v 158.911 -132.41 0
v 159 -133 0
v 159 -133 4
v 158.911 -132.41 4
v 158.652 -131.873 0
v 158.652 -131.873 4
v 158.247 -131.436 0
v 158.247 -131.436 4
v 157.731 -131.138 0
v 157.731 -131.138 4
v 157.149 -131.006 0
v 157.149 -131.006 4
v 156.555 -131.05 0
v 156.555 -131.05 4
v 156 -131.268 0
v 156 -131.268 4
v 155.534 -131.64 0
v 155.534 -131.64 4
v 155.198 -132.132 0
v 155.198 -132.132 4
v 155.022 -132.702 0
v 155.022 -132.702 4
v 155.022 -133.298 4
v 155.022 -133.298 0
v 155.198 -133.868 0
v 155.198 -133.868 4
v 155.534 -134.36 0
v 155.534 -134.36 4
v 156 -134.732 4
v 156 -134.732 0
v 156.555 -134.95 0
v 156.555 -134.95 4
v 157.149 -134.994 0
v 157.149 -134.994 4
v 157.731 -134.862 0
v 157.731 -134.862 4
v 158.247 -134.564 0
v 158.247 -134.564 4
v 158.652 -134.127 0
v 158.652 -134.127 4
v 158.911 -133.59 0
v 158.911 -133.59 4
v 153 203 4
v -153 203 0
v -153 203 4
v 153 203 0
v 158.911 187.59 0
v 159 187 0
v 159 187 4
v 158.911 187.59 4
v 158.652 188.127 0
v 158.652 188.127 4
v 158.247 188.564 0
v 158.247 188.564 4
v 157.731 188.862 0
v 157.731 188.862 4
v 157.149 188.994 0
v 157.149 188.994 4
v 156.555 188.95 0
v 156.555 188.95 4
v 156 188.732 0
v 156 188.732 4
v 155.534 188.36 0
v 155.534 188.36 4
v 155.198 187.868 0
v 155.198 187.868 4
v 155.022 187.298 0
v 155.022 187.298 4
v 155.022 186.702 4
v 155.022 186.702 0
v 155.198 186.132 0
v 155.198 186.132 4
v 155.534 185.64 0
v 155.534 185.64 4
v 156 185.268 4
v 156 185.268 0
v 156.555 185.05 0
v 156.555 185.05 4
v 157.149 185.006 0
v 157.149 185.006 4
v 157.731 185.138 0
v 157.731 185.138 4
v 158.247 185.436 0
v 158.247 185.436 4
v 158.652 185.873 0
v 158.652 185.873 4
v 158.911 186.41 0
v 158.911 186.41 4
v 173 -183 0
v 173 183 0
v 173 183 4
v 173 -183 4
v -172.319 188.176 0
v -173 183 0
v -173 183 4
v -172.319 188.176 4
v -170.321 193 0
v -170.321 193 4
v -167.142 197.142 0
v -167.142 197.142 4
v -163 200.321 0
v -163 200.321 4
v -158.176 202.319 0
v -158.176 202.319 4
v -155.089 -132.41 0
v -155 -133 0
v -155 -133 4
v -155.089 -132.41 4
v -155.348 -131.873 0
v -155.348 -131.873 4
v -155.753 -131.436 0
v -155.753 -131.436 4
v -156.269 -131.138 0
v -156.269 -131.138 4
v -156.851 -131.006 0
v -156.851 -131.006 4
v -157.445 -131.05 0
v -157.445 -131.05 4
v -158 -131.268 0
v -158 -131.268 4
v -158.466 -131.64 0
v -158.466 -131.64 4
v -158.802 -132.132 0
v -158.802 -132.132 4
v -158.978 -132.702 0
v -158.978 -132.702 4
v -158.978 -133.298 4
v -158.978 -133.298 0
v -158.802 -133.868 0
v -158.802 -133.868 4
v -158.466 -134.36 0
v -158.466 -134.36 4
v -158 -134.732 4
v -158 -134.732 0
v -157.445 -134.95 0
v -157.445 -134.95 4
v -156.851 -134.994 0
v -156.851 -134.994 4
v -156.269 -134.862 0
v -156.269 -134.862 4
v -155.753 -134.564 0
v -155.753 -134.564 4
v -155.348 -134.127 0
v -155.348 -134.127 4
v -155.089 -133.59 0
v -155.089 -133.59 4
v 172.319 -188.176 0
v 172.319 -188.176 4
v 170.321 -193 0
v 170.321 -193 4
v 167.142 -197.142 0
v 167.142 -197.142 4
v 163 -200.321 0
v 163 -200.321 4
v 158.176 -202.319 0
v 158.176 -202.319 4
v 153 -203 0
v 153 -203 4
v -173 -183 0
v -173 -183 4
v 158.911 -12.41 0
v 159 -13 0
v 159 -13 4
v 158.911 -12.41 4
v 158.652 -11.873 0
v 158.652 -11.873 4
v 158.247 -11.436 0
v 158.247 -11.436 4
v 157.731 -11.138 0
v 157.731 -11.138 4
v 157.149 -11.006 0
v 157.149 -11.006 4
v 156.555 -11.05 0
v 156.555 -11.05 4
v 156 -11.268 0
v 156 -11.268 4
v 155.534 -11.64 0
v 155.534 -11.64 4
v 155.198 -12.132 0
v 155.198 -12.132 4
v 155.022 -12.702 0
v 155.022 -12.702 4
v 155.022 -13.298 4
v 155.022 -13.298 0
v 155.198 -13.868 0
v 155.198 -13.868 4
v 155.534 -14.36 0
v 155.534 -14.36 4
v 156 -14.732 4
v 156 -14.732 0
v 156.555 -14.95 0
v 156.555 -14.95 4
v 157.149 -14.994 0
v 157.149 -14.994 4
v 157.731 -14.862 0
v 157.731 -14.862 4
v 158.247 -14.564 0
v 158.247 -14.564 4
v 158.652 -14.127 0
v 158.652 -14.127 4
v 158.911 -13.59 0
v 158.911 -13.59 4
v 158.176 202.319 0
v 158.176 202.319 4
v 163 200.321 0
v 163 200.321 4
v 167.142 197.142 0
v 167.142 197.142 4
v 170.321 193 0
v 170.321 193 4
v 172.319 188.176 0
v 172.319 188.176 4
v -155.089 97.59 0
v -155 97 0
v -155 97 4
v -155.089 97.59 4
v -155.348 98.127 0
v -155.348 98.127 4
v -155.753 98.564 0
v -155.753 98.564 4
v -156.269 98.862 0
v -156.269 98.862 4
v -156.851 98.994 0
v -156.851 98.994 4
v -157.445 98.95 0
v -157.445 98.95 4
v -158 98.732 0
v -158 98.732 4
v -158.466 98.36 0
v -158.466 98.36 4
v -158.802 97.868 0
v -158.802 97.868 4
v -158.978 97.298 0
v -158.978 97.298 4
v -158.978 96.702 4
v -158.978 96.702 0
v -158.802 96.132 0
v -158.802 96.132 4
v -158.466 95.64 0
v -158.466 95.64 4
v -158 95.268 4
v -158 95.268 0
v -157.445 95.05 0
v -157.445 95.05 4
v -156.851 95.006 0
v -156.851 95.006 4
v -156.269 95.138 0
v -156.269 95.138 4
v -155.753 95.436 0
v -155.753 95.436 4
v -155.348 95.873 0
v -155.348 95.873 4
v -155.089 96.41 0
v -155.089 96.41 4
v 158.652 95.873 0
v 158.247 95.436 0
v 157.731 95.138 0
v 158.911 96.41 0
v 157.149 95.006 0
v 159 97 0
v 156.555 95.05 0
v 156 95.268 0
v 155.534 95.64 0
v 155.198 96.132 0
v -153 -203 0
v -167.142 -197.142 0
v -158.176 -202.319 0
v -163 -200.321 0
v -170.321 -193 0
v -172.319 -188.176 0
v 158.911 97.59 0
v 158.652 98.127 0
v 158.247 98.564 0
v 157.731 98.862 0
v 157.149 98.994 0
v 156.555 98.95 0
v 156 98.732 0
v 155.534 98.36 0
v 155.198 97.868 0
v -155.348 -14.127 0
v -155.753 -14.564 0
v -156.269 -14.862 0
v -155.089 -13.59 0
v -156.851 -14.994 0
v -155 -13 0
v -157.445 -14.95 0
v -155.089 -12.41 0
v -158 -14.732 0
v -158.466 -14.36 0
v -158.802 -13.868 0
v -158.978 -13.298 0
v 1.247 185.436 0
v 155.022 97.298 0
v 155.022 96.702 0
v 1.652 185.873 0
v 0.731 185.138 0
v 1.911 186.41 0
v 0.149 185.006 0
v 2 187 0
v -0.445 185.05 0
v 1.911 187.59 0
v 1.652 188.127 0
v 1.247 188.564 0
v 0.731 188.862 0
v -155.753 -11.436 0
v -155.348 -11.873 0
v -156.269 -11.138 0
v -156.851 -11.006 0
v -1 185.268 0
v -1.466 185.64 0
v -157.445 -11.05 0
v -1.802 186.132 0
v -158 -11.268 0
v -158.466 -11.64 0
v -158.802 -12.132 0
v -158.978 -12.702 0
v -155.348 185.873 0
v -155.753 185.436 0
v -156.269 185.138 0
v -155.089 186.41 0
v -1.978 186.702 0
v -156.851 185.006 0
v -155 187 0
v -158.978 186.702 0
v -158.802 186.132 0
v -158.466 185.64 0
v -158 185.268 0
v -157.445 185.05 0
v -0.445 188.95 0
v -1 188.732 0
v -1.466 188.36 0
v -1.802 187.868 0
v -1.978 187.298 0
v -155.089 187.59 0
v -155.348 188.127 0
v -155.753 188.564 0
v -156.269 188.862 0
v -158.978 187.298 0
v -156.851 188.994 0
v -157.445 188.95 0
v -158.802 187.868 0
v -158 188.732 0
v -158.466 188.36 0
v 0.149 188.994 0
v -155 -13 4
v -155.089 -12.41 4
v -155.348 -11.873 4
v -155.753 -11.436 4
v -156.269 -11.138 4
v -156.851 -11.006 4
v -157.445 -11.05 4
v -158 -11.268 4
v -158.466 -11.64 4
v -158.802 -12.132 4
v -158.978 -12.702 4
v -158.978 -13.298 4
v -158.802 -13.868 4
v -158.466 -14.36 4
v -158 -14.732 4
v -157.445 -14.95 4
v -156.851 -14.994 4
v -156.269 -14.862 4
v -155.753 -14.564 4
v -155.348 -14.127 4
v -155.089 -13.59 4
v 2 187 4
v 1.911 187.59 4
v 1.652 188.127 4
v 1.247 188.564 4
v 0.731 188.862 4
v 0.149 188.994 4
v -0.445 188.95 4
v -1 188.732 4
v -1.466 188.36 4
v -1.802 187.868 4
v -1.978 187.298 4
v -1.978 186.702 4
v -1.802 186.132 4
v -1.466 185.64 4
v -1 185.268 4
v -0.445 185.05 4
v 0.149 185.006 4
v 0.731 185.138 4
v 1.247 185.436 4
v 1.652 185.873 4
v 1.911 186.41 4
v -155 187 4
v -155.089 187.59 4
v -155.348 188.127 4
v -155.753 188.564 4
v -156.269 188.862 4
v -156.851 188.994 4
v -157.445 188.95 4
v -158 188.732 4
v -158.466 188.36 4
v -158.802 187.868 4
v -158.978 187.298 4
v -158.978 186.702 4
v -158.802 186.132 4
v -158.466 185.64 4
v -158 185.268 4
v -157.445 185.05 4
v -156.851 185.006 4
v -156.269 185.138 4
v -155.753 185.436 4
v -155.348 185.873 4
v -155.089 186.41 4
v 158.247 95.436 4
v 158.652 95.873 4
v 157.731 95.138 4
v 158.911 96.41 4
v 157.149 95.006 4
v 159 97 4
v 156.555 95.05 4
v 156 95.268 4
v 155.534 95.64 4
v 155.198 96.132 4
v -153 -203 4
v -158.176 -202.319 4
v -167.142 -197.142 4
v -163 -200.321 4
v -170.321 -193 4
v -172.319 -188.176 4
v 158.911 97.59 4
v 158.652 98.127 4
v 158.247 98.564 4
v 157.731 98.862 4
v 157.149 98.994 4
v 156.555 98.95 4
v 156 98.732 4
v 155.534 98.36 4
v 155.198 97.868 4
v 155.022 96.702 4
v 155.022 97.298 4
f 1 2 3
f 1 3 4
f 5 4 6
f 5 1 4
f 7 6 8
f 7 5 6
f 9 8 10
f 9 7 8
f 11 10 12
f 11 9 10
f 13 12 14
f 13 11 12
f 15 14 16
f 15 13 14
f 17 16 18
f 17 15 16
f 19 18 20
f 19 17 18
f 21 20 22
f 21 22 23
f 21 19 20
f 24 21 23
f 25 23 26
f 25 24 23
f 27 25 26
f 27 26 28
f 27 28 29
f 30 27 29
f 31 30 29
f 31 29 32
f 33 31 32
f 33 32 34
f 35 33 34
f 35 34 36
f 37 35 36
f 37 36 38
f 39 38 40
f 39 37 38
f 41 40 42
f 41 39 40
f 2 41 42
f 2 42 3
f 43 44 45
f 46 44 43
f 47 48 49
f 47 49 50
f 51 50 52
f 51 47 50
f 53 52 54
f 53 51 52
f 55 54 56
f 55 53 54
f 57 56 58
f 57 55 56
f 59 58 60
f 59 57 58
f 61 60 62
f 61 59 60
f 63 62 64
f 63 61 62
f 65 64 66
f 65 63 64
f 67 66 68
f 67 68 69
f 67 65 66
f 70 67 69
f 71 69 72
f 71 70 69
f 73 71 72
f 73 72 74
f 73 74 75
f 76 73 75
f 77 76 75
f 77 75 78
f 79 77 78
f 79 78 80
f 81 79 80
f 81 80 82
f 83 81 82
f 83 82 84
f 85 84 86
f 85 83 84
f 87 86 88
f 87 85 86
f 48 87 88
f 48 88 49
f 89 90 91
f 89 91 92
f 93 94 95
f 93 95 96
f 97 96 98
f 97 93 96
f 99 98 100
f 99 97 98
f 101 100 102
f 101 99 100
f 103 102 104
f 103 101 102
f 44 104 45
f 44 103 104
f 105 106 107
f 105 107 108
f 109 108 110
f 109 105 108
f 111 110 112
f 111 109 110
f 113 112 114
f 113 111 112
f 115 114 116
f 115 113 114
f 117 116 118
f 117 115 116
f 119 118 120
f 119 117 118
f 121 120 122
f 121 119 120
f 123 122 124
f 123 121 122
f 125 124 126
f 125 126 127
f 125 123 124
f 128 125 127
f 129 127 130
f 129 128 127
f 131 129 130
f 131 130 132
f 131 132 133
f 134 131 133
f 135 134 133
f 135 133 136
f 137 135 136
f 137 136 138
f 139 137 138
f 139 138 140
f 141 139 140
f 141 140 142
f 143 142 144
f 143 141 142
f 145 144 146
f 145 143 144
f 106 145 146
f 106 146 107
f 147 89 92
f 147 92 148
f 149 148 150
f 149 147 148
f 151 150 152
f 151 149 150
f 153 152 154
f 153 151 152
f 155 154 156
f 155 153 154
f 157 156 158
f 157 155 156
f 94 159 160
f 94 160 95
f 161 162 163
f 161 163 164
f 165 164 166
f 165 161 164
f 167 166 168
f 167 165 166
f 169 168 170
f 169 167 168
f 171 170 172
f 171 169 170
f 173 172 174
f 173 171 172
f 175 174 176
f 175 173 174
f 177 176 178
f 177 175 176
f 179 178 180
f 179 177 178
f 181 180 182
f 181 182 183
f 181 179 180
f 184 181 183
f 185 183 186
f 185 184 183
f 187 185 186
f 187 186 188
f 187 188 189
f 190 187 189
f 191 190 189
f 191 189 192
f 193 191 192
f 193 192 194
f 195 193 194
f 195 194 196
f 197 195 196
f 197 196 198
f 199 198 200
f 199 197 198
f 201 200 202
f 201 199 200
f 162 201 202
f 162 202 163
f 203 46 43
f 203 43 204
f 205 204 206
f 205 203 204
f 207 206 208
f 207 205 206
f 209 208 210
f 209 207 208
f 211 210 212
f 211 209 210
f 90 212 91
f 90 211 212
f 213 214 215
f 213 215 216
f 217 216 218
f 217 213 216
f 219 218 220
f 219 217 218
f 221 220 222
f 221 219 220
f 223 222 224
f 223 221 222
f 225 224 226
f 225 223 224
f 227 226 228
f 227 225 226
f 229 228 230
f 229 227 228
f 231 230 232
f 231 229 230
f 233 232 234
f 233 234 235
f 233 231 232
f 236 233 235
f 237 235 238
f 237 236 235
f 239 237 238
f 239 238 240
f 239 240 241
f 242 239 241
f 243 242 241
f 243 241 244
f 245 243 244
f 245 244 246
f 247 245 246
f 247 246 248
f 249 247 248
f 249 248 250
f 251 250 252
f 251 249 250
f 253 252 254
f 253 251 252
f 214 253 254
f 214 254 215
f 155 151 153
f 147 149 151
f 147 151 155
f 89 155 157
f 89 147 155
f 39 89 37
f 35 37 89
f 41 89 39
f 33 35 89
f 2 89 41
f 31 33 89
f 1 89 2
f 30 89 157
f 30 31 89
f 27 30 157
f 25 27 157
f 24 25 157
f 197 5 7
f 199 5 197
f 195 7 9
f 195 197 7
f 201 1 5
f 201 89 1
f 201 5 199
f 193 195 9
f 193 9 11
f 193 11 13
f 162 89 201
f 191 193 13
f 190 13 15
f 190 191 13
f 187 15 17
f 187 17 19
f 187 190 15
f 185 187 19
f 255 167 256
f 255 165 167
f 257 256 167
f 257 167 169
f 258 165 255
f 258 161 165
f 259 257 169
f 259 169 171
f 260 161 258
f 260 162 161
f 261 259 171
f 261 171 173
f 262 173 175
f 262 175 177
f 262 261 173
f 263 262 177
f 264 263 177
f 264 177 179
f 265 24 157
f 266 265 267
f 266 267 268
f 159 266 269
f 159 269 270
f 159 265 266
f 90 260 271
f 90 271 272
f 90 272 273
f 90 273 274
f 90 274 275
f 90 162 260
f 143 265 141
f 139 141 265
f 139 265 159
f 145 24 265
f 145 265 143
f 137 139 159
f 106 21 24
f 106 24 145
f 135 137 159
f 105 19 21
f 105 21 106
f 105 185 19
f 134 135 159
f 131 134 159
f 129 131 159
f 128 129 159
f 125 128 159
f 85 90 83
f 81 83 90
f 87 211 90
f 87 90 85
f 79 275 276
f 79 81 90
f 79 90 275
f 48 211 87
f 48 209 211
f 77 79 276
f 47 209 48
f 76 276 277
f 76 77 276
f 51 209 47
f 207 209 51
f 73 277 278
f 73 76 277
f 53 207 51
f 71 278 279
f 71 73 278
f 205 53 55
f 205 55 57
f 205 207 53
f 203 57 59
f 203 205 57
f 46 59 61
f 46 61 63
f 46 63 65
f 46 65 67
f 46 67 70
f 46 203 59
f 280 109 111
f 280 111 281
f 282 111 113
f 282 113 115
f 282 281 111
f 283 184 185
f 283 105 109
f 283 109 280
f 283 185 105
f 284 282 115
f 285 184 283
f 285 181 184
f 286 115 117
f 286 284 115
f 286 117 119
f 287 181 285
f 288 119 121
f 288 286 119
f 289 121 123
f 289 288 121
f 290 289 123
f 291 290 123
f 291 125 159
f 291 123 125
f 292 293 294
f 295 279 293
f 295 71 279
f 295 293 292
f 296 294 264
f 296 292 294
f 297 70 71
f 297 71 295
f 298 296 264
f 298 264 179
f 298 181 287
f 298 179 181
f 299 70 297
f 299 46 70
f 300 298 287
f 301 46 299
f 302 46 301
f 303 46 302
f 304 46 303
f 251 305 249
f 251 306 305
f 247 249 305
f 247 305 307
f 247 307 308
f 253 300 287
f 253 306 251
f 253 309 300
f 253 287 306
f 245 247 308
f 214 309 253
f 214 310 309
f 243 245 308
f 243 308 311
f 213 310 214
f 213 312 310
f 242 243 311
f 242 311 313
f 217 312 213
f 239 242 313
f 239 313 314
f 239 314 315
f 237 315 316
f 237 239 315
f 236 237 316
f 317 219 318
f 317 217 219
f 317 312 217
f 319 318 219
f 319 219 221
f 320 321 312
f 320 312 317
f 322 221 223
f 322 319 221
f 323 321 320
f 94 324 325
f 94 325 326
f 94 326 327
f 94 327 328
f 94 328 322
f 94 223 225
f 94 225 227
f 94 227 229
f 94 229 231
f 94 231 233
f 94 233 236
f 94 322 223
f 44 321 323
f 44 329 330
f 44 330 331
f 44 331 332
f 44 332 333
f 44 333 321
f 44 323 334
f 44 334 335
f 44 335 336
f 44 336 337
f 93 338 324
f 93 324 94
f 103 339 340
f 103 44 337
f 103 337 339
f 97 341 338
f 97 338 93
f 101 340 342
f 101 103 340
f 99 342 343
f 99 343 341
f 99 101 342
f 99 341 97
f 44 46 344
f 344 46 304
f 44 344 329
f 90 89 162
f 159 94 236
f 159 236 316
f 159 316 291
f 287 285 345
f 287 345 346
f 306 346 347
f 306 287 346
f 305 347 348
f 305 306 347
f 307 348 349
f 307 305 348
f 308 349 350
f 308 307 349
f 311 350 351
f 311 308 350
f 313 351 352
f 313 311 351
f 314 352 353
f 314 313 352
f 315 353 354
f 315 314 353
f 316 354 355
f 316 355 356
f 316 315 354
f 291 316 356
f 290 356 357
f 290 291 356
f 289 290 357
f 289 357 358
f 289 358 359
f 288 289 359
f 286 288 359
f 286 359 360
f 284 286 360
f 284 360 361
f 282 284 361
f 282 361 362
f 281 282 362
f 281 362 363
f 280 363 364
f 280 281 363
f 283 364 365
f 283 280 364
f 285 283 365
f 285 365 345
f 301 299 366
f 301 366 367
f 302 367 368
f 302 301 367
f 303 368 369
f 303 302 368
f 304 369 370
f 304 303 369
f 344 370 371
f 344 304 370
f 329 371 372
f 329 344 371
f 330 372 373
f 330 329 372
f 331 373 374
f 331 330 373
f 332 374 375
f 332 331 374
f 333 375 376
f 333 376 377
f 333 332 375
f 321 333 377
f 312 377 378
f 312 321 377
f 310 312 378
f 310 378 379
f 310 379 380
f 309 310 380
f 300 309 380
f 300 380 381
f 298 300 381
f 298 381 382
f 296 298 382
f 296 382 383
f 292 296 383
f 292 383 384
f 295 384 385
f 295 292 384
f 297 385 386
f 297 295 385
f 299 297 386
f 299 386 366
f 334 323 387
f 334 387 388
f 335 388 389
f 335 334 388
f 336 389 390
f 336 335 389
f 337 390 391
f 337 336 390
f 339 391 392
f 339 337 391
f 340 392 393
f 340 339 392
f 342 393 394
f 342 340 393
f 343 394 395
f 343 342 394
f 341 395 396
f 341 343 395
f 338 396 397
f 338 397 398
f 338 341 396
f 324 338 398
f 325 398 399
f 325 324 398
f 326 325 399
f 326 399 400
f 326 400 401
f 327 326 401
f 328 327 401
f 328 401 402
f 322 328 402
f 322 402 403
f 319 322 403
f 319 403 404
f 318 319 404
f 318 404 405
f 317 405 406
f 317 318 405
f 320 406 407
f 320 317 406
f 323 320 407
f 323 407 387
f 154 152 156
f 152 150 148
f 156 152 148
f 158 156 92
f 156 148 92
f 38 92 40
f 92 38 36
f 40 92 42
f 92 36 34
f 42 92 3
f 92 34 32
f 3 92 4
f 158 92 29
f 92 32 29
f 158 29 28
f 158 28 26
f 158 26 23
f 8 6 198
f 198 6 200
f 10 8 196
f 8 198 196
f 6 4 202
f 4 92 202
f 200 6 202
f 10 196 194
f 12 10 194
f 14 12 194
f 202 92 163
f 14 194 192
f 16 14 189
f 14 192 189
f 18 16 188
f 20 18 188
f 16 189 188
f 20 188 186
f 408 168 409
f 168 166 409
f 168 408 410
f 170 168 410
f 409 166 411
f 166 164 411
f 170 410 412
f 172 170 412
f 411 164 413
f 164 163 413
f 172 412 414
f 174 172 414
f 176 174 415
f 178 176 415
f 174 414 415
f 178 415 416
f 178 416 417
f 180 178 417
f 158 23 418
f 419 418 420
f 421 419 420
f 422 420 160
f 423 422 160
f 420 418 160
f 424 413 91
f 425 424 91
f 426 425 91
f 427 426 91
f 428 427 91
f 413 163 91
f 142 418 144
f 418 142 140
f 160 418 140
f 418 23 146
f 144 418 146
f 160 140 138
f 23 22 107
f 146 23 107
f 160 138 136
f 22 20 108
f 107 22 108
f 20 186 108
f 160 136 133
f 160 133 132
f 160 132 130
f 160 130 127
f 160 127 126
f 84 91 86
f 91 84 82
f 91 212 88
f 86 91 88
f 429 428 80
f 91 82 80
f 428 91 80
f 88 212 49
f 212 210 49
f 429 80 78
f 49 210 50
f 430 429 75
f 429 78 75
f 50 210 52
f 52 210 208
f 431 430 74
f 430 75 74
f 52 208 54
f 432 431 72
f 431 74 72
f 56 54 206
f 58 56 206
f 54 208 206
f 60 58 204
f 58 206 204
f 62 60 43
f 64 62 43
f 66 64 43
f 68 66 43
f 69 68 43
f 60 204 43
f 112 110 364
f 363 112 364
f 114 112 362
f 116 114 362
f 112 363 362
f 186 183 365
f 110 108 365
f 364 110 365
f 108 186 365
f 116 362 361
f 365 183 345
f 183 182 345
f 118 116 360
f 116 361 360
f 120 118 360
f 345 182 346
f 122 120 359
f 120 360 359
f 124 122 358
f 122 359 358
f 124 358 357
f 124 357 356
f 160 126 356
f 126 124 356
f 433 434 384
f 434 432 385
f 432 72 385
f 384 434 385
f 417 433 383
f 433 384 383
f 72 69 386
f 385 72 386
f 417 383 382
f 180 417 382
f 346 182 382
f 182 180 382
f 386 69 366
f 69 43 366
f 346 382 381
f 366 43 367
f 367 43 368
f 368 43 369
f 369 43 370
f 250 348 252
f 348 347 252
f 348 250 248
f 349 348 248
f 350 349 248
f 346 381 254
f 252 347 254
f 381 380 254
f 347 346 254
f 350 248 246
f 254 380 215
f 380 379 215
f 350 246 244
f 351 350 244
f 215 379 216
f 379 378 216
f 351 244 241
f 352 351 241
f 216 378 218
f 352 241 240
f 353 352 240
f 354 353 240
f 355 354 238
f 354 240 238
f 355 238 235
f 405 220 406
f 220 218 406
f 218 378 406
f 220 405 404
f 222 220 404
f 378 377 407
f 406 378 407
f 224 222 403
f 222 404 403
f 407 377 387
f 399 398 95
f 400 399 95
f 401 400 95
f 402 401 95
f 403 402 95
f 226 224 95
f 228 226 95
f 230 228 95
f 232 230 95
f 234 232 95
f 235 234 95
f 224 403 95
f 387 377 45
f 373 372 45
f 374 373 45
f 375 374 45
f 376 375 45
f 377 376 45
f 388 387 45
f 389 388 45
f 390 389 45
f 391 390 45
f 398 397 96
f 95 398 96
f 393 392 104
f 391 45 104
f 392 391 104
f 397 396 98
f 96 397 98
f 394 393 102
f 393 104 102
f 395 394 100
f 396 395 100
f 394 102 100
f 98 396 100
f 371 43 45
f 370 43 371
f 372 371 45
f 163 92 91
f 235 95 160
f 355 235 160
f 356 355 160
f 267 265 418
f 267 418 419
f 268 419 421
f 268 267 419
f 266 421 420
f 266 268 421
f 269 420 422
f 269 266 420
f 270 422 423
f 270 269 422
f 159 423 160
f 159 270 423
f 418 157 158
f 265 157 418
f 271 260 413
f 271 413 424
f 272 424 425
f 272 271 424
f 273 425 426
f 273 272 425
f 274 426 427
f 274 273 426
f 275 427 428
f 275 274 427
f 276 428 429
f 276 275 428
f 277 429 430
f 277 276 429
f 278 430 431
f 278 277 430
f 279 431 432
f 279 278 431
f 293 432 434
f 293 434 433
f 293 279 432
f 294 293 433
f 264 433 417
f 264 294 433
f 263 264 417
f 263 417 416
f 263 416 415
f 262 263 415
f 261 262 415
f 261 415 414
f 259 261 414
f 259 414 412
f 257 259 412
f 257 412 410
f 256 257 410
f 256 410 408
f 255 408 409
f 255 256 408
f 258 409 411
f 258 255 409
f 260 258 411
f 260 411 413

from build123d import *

# Parameters (mm, degrees)
SKETCH1_R           = 2
BOSS_EXTRUDE1_DEPTH = 4


with BuildPart() as part:
    # Sketch1 → Boss-Extrude1 (new body)
    with BuildSketch(Plane.XY):
        with BuildLine():
            Line((-153, 203), (153, 203))
            ThreePointArc((153, 203), (167.142135624, 197.142135624), (173, 183))
            Line((173, 183), (173, -183))
            ThreePointArc((173, -183), (167.142135624, -197.142135624), (153, -203))
            Line((153, -203), (-153, -203))
            ThreePointArc((-153, -203), (-167.142135624, -197.142135624), (-173, -183))
            Line((-173, -183), (-173, 183))
            ThreePointArc((-173, 183), (-167.142135624, 197.142135624), (-153, 203))
        make_face()
        with Locations((-157, 187)):
            Circle(SKETCH1_R, mode=Mode.SUBTRACT)
        with Locations((-157, 97)):
            Circle(SKETCH1_R, mode=Mode.SUBTRACT)
        with Locations((-157, -13)):
            Circle(SKETCH1_R, mode=Mode.SUBTRACT)
        with Locations((-157, -133)):
            Circle(SKETCH1_R, mode=Mode.SUBTRACT)
        with Locations((157, -133)):
            Circle(SKETCH1_R, mode=Mode.SUBTRACT)
        with Locations((157, -13)):
            Circle(SKETCH1_R, mode=Mode.SUBTRACT)
        with Locations((157, 97)):
            Circle(SKETCH1_R, mode=Mode.SUBTRACT)
        with Locations((157, 187)):
            Circle(SKETCH1_R, mode=Mode.SUBTRACT)
        with Locations((0, 187)):
            Circle(SKETCH1_R, mode=Mode.SUBTRACT)
    extrude(amount=BOSS_EXTRUDE1_DEPTH)


solid = part.part
